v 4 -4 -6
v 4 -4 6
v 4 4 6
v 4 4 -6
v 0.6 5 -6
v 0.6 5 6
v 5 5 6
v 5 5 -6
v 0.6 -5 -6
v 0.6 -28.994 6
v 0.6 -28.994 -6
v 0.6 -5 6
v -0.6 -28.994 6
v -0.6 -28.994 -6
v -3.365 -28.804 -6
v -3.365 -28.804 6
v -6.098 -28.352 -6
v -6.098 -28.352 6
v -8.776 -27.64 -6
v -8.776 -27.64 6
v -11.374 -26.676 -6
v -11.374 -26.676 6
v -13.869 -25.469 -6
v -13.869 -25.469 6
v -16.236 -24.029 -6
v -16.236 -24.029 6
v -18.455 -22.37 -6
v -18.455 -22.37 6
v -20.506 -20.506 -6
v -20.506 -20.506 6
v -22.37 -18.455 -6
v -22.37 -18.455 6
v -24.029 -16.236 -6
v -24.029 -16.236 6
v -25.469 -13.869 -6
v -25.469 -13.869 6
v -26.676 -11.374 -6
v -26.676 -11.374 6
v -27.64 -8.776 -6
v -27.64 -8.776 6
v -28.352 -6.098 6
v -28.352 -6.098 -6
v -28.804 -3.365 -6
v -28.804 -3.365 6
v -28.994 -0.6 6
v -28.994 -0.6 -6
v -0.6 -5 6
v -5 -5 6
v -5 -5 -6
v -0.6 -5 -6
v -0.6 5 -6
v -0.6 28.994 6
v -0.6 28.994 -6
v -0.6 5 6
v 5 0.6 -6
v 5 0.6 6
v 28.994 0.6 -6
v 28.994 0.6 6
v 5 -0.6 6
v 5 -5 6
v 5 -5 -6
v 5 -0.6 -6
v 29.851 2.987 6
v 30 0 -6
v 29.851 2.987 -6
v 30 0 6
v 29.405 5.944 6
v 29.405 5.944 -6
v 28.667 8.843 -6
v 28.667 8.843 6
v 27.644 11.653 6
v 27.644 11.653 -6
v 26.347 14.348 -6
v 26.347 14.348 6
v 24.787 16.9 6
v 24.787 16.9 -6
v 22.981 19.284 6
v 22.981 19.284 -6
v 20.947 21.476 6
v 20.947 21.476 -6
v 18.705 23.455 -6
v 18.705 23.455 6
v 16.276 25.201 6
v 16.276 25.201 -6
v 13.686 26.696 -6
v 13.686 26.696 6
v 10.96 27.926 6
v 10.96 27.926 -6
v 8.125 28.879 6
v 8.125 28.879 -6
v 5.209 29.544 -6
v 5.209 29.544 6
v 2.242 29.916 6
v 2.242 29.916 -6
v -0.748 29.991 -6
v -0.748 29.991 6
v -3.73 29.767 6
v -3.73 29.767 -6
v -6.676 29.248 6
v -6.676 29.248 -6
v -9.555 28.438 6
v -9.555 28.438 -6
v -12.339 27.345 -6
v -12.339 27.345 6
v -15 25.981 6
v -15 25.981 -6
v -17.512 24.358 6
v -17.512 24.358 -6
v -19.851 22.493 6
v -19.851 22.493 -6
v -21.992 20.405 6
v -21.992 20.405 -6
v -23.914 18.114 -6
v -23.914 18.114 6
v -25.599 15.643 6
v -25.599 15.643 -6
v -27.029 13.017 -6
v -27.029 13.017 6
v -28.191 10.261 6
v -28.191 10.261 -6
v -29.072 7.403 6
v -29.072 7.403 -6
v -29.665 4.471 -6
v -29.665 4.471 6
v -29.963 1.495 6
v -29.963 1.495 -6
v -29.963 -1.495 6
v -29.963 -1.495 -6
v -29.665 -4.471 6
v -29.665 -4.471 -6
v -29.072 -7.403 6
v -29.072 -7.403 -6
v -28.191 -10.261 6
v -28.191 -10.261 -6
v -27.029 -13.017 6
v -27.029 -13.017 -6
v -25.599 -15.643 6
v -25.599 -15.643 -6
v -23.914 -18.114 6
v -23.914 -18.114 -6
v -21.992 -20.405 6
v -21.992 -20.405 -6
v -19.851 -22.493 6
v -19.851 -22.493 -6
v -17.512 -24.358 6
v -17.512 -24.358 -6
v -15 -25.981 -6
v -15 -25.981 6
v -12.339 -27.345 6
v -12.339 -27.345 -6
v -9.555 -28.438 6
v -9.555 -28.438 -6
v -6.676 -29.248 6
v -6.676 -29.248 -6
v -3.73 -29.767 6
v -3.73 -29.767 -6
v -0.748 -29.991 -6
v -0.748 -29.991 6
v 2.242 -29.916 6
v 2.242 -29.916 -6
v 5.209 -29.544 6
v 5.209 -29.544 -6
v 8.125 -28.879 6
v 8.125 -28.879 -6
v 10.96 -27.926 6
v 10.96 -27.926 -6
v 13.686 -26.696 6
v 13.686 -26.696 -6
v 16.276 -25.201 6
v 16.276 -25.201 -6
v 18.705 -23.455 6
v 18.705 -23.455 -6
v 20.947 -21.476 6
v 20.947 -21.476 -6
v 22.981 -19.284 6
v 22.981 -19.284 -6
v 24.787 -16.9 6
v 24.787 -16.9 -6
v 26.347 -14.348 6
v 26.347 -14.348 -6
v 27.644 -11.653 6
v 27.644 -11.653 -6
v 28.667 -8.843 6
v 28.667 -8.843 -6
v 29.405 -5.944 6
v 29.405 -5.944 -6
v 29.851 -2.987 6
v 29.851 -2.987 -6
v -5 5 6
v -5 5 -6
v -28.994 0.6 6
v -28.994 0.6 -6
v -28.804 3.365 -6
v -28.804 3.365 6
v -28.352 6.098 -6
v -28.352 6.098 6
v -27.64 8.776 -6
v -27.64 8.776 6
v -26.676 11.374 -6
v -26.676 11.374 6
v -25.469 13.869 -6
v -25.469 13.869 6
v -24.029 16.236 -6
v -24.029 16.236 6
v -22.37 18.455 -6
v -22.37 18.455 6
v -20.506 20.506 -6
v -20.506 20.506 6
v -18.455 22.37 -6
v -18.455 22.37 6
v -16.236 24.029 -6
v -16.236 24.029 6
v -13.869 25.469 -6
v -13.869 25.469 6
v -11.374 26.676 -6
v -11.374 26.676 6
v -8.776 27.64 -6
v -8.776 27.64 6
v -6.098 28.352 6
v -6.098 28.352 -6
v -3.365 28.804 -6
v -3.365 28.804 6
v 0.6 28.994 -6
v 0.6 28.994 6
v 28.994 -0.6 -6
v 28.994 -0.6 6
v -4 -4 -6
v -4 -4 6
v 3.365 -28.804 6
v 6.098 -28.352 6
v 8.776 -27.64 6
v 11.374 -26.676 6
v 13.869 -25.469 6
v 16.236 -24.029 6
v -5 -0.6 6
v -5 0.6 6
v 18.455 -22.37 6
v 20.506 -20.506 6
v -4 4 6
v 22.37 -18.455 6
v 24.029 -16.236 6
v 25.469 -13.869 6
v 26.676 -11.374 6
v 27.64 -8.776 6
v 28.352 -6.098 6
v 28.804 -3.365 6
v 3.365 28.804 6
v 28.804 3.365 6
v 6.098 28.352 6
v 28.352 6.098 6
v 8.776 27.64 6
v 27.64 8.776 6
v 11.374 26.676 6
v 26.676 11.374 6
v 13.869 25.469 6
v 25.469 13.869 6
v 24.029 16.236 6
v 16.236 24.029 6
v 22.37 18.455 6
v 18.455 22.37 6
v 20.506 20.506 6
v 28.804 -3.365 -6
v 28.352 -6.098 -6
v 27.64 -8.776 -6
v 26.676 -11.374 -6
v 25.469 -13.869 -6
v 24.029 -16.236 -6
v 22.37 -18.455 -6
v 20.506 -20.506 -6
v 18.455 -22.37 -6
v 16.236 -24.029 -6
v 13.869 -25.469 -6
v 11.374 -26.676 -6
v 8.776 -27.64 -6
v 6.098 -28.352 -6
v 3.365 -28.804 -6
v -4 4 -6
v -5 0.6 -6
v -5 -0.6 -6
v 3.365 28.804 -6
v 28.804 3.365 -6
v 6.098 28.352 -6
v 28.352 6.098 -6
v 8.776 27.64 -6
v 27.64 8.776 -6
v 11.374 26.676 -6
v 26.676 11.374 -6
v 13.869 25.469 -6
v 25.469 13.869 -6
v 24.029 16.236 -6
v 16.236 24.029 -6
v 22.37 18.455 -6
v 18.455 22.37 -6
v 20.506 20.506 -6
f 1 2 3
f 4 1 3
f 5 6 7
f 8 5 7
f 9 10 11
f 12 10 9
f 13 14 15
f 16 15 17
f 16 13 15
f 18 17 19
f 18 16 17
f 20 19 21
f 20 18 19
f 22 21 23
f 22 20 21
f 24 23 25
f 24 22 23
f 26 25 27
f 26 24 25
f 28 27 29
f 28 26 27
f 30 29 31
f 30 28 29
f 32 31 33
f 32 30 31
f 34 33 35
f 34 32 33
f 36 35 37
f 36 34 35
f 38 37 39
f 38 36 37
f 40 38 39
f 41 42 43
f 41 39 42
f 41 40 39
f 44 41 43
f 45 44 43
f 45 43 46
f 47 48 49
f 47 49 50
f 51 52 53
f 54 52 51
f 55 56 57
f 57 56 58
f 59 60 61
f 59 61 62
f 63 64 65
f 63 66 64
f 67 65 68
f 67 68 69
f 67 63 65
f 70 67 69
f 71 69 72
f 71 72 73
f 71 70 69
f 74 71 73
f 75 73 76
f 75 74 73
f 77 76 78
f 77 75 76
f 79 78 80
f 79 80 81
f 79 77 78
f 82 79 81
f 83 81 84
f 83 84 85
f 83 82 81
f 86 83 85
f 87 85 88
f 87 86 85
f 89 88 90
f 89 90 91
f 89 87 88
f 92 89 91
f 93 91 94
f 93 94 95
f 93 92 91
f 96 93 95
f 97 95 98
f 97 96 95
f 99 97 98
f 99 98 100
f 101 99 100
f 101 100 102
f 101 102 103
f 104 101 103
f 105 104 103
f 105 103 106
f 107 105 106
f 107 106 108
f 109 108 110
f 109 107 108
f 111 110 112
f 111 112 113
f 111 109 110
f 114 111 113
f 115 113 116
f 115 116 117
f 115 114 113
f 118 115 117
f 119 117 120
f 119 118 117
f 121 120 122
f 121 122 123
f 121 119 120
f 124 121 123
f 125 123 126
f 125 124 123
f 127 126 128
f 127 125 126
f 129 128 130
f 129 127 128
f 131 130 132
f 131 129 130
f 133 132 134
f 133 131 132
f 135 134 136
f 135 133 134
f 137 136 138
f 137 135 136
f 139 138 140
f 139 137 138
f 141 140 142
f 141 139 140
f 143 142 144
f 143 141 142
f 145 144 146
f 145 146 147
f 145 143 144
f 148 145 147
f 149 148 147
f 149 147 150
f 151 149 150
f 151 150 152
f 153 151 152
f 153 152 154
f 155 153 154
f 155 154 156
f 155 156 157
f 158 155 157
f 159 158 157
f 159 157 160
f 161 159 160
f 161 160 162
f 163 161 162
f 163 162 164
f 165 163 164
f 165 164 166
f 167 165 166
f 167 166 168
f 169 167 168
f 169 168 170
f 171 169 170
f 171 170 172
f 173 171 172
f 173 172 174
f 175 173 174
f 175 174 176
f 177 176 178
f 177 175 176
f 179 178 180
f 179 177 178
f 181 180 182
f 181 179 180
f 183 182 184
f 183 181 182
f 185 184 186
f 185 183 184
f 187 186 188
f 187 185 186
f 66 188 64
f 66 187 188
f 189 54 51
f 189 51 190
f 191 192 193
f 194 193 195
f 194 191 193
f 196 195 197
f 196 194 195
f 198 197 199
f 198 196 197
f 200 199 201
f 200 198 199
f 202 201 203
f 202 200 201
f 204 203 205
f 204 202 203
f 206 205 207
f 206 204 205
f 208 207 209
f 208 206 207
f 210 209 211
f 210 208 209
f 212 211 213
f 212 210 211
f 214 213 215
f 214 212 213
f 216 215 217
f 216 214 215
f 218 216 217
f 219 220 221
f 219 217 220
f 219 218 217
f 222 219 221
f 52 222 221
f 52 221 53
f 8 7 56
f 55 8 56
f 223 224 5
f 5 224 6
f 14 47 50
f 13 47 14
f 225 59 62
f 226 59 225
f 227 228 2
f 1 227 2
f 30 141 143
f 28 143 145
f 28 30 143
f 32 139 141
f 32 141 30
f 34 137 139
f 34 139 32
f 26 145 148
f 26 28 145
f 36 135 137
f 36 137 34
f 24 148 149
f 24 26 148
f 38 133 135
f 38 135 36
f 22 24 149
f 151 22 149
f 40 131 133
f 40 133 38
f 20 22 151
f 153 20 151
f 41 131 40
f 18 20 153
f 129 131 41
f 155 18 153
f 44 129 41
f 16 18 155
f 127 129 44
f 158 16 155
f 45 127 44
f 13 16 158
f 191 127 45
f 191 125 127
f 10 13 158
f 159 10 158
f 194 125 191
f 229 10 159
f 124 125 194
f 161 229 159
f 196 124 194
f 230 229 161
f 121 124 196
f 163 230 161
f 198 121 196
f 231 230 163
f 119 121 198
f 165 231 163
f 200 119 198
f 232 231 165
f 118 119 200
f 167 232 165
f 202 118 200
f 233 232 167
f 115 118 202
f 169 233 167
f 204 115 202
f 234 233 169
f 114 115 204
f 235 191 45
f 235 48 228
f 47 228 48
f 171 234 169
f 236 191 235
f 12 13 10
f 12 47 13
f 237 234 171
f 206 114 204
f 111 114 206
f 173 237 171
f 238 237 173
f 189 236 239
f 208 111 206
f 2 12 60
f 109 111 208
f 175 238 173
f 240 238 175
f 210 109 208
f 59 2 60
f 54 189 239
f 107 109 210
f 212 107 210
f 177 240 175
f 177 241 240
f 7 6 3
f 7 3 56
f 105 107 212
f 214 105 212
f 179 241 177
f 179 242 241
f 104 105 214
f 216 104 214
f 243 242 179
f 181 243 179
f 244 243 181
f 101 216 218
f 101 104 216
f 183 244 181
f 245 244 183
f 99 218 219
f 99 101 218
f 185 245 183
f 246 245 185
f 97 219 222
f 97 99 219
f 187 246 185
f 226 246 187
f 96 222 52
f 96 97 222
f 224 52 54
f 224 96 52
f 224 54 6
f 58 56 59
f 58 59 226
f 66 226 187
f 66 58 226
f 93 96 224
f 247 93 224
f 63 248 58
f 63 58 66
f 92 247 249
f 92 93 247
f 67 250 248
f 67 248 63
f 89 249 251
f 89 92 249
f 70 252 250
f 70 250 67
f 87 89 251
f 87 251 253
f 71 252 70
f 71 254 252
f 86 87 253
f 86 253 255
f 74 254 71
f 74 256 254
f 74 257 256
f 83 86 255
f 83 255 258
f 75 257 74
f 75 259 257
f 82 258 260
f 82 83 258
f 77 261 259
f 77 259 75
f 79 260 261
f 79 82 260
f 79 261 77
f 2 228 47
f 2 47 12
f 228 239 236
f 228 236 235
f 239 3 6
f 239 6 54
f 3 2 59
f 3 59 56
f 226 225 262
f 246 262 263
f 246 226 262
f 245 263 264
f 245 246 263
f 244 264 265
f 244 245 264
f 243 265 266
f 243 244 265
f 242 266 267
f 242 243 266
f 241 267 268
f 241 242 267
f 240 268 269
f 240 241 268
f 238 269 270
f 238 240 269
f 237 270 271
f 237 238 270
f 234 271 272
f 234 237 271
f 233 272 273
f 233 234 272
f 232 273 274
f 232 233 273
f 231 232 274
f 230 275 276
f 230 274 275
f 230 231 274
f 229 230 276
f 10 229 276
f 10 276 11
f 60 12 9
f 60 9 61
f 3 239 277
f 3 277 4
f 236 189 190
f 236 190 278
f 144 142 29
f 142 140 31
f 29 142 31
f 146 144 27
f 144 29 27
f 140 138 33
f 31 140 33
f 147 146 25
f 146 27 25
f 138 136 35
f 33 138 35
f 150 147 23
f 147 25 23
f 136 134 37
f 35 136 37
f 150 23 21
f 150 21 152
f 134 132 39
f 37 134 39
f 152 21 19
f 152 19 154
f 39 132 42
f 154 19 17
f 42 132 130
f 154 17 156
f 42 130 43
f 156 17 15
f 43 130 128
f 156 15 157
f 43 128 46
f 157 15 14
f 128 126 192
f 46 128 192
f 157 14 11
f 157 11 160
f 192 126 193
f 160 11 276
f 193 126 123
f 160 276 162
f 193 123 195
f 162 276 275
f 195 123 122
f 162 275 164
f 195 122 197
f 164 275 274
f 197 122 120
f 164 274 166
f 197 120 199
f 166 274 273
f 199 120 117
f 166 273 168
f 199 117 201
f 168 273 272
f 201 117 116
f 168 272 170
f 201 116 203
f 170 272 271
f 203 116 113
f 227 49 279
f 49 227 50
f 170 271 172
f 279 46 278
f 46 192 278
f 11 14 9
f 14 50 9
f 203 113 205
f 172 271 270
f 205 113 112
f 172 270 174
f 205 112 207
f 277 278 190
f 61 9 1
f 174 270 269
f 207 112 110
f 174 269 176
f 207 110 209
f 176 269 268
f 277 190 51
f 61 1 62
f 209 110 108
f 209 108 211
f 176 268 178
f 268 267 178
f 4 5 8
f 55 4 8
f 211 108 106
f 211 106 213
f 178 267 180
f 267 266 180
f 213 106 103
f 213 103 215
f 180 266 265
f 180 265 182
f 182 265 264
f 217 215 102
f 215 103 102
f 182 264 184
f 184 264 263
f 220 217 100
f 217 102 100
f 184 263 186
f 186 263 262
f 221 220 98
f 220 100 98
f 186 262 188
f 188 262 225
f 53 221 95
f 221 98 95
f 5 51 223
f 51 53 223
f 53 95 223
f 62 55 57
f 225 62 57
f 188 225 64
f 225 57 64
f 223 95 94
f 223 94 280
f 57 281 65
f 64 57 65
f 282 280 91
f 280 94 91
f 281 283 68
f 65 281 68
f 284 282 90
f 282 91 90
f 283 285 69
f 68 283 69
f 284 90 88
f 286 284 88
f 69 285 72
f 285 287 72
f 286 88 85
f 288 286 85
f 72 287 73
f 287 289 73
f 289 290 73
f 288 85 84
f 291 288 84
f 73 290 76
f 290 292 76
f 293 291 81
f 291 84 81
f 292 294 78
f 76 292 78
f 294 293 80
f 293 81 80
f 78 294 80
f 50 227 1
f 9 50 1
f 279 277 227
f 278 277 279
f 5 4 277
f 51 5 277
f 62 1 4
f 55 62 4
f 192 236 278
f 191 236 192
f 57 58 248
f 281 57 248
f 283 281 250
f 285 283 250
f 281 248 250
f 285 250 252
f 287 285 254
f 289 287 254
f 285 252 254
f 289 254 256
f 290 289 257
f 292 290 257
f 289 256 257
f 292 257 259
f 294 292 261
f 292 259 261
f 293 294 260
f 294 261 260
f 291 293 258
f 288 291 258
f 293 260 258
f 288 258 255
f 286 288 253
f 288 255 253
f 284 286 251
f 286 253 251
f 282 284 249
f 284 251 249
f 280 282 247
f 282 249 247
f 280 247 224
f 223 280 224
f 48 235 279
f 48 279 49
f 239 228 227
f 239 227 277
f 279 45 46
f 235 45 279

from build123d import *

# Parameters (mm, degrees)
SKETCH_1_R          = 30
EXTRUDE_2_DEPTH     = 6
SKETCH_6_W          = 8
SKETCH_6_H          = 8
CUT_EXTRUDE_2_DEPTH = 45.09081537


with BuildPart() as part:
    # 草图1 → 凸台-拉伸2 (new, symmetric)
    with BuildSketch(Plane.XY):
        Circle(SKETCH_1_R)
    extrude(amount=EXTRUDE_2_DEPTH, both=True)

    # 草图6 → 切除-拉伸2 (cut, through all)
    with BuildSketch(Plane.XY.offset(6)):
        with BuildLine():
            Line((-0.6, 28.993792439), (-0.6, 5))
            Line((-0.6, 5), (-5, 5))
            Line((-5, 5), (-5, 0.6))
            Line((-5, 0.6), (-28.993792439, 0.6))
            ThreePointArc((-28.993792439, 0.6), (-20.506096654, 20.506096654), (-0.6, 28.993792439))
        make_face()
        with BuildLine():
            Line((-28.993792439, -0.6), (-5, -0.6))
            Line((-5, -0.6), (-5, -5))
            Line((-5, -5), (-0.6, -5))
            Line((-0.6, -5), (-0.6, -28.993792439))
            ThreePointArc((-0.6, -28.993792439), (-20.506096654, -20.506096654), (-28.993792439, -0.6))
        make_face()
        with BuildLine():
            Line((0.6, 28.993792439), (0.6, 5))
            Line((0.6, 5), (5, 5))
            Line((5, 5), (5, 0.6))
            Line((5, 0.6), (28.993792439, 0.6))
            ThreePointArc((28.993792439, 0.6), (20.506096654, 20.506096654), (0.6, 28.993792439))
        make_face()
        with BuildLine():
            Line((5, -0.6), (28.993792439, -0.6))
            ThreePointArc((28.993792439, -0.6), (20.506096654, -20.506096654), (0.6, -28.993792439))
            Line((0.6, -28.993792439), (0.6, -5))
            Line((0.6, -5), (5, -5))
            Line((5, -5), (5, -0.6))
        make_face()
        Rectangle(SKETCH_6_W, SKETCH_6_H)
    extrude(amount=-CUT_EXTRUDE_2_DEPTH, mode=Mode.SUBTRACT)


solid = part.part
